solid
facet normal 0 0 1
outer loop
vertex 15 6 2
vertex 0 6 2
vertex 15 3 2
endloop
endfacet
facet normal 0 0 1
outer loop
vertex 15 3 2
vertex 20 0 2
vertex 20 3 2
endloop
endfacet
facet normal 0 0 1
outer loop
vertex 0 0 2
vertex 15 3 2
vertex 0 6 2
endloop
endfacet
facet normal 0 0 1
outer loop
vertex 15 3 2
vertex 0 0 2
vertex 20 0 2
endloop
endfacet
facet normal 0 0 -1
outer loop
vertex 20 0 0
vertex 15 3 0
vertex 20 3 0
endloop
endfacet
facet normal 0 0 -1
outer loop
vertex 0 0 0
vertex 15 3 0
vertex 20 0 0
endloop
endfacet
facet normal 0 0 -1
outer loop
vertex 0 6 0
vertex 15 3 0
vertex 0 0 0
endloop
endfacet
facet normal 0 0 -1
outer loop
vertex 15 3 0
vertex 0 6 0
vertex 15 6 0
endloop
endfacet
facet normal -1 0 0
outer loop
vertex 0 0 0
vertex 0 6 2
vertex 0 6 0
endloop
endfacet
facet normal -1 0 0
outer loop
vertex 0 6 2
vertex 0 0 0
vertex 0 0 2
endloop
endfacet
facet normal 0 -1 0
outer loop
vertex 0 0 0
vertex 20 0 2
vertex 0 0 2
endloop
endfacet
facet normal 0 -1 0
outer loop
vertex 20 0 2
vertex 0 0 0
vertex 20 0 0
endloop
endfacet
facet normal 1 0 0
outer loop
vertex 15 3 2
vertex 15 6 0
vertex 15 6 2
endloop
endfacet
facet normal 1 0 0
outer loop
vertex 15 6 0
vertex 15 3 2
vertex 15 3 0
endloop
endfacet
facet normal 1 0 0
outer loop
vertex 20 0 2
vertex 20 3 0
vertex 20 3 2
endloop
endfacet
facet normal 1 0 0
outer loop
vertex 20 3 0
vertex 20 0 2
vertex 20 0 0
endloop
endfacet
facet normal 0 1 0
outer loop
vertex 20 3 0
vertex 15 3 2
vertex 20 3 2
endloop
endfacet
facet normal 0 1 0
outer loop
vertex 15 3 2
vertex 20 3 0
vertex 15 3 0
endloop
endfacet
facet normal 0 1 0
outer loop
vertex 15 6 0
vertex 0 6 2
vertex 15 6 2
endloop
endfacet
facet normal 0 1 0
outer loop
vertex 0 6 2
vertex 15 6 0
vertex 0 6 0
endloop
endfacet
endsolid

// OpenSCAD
translate([2.5, 1.5, 1.0]) color([0.4147216089714424, 0.09940033823870109, 0.9086575543967805]) cube([5, 3, 2], center=true);
translate([7.5, 1.5, 1.0]) color([0.4740046511372964, 0.8408483326276716, 0.976229457649057]) cube([5, 3, 2], center=true);
translate([12.5, 1.5, 1.0]) color([0.34365159365776776, 0.4790865191519861, 0.6995952911506185]) cube([5, 3, 2], center=true);
translate([17.5, 1.5, 1.0]) color([0.42653532354402823, 0.30190311621935595, 0.7347509912186152]) cube([5, 3, 2], center=true);
translate([2.5, 4.5, 1.0]) color([0.8943997782145745, 0.9196888444316101, 0.6267420468068673]) cube([5, 3, 2], center=true);
translate([7.5, 4.5, 1.0]) color([0.3755713463285453, 0.9745605214796941, 0.6388785175004733]) cube([5, 3, 2], center=true);
translate([12.5, 4.5, 1.0]) color([0.06583467727730097, 0.08466956912011114, 0.749869571783086]) cube([5, 3, 2], center=true);
